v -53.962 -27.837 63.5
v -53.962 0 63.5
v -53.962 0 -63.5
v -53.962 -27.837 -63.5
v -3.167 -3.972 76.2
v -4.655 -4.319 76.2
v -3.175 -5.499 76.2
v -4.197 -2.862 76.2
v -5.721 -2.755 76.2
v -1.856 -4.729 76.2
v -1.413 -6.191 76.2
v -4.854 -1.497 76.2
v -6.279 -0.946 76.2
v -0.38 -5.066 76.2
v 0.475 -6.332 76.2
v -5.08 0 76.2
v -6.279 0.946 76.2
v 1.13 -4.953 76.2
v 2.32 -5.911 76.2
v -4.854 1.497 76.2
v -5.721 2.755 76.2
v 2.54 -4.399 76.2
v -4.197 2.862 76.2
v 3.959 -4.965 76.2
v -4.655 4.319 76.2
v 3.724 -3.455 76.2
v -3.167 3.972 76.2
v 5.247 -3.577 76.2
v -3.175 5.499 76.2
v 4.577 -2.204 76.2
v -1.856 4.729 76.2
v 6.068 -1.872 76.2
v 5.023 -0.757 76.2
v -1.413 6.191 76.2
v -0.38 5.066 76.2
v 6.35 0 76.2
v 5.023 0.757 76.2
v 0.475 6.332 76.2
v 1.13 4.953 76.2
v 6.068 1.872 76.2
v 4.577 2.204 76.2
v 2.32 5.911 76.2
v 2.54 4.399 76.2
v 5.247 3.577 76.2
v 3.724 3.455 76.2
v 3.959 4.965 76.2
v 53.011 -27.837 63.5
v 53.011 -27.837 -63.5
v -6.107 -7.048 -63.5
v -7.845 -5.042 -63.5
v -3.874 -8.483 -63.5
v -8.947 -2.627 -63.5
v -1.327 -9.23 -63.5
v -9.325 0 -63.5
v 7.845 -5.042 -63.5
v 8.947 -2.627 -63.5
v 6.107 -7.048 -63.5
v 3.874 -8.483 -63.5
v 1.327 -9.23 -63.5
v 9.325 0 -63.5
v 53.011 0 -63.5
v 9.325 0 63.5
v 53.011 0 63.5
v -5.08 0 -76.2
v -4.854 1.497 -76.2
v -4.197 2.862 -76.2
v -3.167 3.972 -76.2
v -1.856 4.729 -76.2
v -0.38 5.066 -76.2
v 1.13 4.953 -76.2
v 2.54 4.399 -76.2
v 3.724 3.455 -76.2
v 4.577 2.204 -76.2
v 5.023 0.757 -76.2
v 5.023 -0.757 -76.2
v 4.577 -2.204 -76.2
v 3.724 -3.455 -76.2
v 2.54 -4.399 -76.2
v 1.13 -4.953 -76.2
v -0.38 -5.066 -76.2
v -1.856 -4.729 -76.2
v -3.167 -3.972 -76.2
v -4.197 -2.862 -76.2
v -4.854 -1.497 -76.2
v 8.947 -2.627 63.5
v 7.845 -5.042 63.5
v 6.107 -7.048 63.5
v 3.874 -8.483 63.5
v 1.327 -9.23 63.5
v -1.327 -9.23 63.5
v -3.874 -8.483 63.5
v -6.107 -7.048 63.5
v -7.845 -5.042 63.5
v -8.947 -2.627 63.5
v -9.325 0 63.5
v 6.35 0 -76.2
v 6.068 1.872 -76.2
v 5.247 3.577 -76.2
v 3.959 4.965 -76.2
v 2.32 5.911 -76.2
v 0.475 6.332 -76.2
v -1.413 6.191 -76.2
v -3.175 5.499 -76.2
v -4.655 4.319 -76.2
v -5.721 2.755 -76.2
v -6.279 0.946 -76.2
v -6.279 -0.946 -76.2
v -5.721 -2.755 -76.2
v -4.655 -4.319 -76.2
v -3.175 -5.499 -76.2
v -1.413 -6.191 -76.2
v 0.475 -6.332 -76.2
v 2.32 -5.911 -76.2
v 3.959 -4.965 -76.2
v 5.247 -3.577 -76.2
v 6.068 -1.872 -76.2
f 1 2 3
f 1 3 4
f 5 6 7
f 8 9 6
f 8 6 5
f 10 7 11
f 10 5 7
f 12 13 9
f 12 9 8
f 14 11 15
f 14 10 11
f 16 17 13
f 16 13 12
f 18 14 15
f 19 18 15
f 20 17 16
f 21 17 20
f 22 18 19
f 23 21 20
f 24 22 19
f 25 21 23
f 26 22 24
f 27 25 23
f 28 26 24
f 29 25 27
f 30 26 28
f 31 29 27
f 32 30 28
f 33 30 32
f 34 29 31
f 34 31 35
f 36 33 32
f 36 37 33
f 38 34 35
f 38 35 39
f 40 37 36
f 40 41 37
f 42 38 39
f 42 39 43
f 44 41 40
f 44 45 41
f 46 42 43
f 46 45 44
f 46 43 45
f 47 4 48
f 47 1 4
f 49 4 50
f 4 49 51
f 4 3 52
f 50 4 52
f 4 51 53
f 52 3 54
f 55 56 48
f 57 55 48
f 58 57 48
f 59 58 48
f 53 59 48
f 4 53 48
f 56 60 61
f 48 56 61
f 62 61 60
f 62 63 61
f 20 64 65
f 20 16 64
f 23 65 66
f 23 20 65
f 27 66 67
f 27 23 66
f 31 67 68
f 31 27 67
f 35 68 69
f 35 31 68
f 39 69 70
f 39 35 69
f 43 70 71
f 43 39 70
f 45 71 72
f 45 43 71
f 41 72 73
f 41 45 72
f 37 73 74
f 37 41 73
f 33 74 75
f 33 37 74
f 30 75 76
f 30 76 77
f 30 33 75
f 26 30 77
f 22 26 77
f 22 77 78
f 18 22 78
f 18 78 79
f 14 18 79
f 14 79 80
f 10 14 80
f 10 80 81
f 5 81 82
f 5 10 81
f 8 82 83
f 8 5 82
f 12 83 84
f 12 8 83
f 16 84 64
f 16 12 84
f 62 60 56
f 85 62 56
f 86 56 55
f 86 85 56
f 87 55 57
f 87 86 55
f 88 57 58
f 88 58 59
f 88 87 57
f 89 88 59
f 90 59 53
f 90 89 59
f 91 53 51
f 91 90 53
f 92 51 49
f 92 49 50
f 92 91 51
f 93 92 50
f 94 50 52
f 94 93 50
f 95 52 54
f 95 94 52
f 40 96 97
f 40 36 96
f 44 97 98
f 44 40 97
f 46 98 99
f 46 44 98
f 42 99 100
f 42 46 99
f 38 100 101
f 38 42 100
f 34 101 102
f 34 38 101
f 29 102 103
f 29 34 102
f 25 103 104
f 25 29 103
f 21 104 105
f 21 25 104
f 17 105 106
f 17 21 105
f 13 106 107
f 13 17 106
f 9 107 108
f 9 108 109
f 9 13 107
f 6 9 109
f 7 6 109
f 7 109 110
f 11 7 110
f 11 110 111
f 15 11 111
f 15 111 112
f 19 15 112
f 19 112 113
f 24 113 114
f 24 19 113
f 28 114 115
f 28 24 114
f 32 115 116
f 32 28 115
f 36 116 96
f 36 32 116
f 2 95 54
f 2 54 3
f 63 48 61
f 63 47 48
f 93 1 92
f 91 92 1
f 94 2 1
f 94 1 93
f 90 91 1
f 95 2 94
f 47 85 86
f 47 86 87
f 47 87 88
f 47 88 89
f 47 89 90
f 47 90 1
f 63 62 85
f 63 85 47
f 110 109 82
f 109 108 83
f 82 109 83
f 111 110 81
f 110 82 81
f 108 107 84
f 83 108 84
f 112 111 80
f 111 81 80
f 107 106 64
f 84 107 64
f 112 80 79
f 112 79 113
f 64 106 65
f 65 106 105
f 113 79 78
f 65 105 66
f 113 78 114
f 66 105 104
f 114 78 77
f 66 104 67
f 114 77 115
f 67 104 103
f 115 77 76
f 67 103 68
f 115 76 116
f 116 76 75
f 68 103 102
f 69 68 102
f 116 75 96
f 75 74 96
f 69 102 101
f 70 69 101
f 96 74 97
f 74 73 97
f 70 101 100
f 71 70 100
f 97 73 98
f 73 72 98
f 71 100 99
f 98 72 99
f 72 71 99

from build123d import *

# Parameters (mm, degrees)
F2_DEPTH = 63.5
F3_DEPTH = 76.2


with BuildPart() as f2:
    # F1 (on face) → F2 (new body, symmetric)
    with BuildSketch(Plane.XY):
        with BuildLine():
            Line((53.010777, 0), (9.325226, 0))
            ThreePointArc((9.325226, 0), (0, -9.325226), (-9.325226, 0))
            Line((-9.325226, 0), (-53.961772, 0))
            Line((-53.961772, 0), (-53.961772, -27.837317))
            Line((-53.961772, -27.837317), (53.010777, -27.837317))
            Line((53.010777, -27.837317), (53.010777, 0))
        make_face()
    extrude(amount=F2_DEPTH, both=True)


with BuildPart() as f3:
    # F0 (on Top) → F3 (new body, symmetric)
    with BuildSketch(Plane.XY):
        with BuildLine():
            Line((6.35, 0), (5.08, 0))
            ThreePointArc((5.08, 0), (0, -5.08), (-5.08, 0))
            Line((-5.08, 0), (-6.35, 0))
            ThreePointArc((-6.35, 0), (0, -6.35), (6.35, 0))
        make_face()
        with BuildLine():
            ThreePointArc((-5.08, 0), (0, 5.08), (5.08, 0))
            Line((5.08, 0), (6.35, 0))
            ThreePointArc((6.35, 0), (0, 6.35), (-6.35, 0))
            Line((-6.35, 0), (-5.08, 0))
        make_face()
    extrude(amount=F3_DEPTH, both=True)


solid = Compound([f2.part, f3.part])
